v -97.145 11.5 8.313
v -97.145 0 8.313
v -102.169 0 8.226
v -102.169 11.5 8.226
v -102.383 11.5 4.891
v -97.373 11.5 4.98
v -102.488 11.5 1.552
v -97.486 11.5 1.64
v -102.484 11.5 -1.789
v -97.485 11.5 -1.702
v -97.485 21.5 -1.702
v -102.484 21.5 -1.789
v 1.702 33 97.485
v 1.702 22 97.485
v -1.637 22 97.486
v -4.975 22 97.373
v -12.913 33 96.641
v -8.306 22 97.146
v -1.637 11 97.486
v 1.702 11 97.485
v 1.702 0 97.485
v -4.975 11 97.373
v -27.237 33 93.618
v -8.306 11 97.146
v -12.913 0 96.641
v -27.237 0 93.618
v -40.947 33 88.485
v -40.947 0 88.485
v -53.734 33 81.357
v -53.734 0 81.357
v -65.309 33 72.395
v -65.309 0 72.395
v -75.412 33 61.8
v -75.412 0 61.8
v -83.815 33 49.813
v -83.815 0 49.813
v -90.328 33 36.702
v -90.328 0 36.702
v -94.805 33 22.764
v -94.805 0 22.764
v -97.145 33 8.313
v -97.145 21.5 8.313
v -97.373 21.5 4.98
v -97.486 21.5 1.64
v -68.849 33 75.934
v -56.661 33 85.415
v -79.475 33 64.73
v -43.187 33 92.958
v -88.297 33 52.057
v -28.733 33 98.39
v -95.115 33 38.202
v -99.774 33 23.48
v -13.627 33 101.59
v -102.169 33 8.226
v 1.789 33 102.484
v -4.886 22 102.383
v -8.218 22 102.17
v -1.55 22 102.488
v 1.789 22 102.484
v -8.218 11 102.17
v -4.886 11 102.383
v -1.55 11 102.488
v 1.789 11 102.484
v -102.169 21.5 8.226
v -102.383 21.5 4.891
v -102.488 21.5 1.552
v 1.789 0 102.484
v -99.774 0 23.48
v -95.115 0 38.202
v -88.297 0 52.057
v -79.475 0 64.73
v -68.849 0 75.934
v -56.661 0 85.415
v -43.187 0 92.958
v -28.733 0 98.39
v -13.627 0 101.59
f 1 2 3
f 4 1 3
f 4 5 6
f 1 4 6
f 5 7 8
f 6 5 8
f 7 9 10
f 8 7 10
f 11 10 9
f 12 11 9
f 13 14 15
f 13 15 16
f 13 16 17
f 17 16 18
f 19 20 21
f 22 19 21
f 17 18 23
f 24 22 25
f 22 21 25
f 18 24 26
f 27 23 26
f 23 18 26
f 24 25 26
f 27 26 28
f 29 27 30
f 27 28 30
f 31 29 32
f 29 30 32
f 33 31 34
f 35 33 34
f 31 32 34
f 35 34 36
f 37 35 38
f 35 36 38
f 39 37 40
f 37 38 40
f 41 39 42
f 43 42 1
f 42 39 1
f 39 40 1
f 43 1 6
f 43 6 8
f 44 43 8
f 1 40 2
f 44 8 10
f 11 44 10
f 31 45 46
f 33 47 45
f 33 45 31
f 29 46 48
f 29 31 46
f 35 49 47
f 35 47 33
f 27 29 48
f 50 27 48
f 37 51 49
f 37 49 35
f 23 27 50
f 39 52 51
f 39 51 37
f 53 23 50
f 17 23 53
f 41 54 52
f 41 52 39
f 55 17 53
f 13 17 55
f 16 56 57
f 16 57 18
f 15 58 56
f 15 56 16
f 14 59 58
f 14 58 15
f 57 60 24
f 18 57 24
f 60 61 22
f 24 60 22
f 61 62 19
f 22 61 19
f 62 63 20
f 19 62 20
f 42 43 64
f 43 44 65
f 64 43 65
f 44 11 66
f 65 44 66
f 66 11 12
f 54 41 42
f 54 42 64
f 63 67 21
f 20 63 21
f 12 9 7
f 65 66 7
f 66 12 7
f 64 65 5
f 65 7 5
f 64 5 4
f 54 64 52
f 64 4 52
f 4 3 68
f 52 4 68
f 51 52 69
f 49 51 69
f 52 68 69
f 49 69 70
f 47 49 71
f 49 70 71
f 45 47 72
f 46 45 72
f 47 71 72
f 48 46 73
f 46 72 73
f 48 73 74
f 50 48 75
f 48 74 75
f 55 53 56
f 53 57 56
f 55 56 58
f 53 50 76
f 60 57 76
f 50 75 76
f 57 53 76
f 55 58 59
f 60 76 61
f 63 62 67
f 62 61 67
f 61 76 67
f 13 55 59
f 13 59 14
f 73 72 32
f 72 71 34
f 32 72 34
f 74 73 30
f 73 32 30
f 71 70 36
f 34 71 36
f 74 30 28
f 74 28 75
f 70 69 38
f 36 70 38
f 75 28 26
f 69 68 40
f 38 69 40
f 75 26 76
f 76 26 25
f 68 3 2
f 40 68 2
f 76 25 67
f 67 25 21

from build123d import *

# Parameters (mm, degrees)
BOSS_EXTRUDE3_DEPTH = 33
SKETCH3_W           = 10.19694267
SKETCH3_H           = 11
CUT_EXTRUDE1_DEPTH  = 10
SKETCH4_W           = 3.453847424
SKETCH4_H           = 11.5
SKETCH4_W_2         = 5
SKETCH4_W_3         = 11.907694848
CUT_EXTRUDE2_DEPTH  = 10.007450565


with BuildPart() as part:
    # Sketch1 → Boss-Extrude3 (new body)
    with BuildSketch(Plane(origin=(0, 0, 0), x_dir=(1, 0, 0), z_dir=(0, 1, 0))):
        with BuildLine():
            Line((-97.485150278, 1.701609628), (-102.484388754, 1.78887166))
            ThreePointArc((-102.484388754, 1.78887166), (-72.478445072, -72.478445072), (1.78887166, -102.484388754))
            Line((1.78887166, -102.484388754), (1.701609628, -97.485150278))
            ThreePointArc((1.701609628, -97.485150278), (-68.942911166, -68.942911166), (-97.485150278, 1.701609628))
        make_face()
    extrude(amount=BOSS_EXTRUDE3_DEPTH)

    # Sketch3 → Cut-Extrude1 (cut)
    with BuildSketch(Plane(origin=(0, 0, 0), x_dir=(-0.017452406437284955, 0, -0.9998476951563913), z_dir=(0.9998476951563912, 0, -0.01745240643728495))):
        with Locations((-100, 16.5)):
            Rectangle(SKETCH3_W, SKETCH3_H)
    extrude(amount=-CUT_EXTRUDE1_DEPTH, mode=Mode.SUBTRACT)

    # Sketch4 → Cut-Extrude2 (cut)
    with BuildSketch(Plane(origin=(0, 0, 0), x_dir=(-0.9998476951563914, 0, -0.01745240643727919), z_dir=(0.01745240643727919, 0, -0.9998476951563914))):
        with Locations((104.226923712, 5.75)):
            Rectangle(SKETCH4_W, SKETCH4_H)
        with Locations((95.773076288, 5.75)):
            Rectangle(SKETCH4_W, SKETCH4_H)
        with Locations((100, 5.75)):
            Rectangle(SKETCH4_W_2, SKETCH4_H)
        with Locations((100, 27.25)):
            Rectangle(SKETCH4_W_3, SKETCH4_H)
    extrude(amount=-CUT_EXTRUDE2_DEPTH, mode=Mode.SUBTRACT)


solid = part.part
